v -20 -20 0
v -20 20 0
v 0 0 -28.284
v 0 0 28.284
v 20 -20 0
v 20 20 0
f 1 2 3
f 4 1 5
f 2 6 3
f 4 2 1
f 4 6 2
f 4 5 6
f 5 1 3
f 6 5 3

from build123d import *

# Parameters (mm, degrees)
F0_W = 40
F0_H = 40


with BuildPart() as f2:
    # F0 (on Top) → F2 section 0
    with BuildSketch(Plane.XY, mode=Mode.PRIVATE) as f2_s0:
        Rectangle(F0_W, F0_H)
    loft([f2_s0.sketch, Vertex(0, 0, 28.284271)])

    # F3: F2 across plane


with BuildPart() as f2_1:
    add(f2.part)
    add(f2.part.mirror(Plane.XY))


solid = f2_1.part
